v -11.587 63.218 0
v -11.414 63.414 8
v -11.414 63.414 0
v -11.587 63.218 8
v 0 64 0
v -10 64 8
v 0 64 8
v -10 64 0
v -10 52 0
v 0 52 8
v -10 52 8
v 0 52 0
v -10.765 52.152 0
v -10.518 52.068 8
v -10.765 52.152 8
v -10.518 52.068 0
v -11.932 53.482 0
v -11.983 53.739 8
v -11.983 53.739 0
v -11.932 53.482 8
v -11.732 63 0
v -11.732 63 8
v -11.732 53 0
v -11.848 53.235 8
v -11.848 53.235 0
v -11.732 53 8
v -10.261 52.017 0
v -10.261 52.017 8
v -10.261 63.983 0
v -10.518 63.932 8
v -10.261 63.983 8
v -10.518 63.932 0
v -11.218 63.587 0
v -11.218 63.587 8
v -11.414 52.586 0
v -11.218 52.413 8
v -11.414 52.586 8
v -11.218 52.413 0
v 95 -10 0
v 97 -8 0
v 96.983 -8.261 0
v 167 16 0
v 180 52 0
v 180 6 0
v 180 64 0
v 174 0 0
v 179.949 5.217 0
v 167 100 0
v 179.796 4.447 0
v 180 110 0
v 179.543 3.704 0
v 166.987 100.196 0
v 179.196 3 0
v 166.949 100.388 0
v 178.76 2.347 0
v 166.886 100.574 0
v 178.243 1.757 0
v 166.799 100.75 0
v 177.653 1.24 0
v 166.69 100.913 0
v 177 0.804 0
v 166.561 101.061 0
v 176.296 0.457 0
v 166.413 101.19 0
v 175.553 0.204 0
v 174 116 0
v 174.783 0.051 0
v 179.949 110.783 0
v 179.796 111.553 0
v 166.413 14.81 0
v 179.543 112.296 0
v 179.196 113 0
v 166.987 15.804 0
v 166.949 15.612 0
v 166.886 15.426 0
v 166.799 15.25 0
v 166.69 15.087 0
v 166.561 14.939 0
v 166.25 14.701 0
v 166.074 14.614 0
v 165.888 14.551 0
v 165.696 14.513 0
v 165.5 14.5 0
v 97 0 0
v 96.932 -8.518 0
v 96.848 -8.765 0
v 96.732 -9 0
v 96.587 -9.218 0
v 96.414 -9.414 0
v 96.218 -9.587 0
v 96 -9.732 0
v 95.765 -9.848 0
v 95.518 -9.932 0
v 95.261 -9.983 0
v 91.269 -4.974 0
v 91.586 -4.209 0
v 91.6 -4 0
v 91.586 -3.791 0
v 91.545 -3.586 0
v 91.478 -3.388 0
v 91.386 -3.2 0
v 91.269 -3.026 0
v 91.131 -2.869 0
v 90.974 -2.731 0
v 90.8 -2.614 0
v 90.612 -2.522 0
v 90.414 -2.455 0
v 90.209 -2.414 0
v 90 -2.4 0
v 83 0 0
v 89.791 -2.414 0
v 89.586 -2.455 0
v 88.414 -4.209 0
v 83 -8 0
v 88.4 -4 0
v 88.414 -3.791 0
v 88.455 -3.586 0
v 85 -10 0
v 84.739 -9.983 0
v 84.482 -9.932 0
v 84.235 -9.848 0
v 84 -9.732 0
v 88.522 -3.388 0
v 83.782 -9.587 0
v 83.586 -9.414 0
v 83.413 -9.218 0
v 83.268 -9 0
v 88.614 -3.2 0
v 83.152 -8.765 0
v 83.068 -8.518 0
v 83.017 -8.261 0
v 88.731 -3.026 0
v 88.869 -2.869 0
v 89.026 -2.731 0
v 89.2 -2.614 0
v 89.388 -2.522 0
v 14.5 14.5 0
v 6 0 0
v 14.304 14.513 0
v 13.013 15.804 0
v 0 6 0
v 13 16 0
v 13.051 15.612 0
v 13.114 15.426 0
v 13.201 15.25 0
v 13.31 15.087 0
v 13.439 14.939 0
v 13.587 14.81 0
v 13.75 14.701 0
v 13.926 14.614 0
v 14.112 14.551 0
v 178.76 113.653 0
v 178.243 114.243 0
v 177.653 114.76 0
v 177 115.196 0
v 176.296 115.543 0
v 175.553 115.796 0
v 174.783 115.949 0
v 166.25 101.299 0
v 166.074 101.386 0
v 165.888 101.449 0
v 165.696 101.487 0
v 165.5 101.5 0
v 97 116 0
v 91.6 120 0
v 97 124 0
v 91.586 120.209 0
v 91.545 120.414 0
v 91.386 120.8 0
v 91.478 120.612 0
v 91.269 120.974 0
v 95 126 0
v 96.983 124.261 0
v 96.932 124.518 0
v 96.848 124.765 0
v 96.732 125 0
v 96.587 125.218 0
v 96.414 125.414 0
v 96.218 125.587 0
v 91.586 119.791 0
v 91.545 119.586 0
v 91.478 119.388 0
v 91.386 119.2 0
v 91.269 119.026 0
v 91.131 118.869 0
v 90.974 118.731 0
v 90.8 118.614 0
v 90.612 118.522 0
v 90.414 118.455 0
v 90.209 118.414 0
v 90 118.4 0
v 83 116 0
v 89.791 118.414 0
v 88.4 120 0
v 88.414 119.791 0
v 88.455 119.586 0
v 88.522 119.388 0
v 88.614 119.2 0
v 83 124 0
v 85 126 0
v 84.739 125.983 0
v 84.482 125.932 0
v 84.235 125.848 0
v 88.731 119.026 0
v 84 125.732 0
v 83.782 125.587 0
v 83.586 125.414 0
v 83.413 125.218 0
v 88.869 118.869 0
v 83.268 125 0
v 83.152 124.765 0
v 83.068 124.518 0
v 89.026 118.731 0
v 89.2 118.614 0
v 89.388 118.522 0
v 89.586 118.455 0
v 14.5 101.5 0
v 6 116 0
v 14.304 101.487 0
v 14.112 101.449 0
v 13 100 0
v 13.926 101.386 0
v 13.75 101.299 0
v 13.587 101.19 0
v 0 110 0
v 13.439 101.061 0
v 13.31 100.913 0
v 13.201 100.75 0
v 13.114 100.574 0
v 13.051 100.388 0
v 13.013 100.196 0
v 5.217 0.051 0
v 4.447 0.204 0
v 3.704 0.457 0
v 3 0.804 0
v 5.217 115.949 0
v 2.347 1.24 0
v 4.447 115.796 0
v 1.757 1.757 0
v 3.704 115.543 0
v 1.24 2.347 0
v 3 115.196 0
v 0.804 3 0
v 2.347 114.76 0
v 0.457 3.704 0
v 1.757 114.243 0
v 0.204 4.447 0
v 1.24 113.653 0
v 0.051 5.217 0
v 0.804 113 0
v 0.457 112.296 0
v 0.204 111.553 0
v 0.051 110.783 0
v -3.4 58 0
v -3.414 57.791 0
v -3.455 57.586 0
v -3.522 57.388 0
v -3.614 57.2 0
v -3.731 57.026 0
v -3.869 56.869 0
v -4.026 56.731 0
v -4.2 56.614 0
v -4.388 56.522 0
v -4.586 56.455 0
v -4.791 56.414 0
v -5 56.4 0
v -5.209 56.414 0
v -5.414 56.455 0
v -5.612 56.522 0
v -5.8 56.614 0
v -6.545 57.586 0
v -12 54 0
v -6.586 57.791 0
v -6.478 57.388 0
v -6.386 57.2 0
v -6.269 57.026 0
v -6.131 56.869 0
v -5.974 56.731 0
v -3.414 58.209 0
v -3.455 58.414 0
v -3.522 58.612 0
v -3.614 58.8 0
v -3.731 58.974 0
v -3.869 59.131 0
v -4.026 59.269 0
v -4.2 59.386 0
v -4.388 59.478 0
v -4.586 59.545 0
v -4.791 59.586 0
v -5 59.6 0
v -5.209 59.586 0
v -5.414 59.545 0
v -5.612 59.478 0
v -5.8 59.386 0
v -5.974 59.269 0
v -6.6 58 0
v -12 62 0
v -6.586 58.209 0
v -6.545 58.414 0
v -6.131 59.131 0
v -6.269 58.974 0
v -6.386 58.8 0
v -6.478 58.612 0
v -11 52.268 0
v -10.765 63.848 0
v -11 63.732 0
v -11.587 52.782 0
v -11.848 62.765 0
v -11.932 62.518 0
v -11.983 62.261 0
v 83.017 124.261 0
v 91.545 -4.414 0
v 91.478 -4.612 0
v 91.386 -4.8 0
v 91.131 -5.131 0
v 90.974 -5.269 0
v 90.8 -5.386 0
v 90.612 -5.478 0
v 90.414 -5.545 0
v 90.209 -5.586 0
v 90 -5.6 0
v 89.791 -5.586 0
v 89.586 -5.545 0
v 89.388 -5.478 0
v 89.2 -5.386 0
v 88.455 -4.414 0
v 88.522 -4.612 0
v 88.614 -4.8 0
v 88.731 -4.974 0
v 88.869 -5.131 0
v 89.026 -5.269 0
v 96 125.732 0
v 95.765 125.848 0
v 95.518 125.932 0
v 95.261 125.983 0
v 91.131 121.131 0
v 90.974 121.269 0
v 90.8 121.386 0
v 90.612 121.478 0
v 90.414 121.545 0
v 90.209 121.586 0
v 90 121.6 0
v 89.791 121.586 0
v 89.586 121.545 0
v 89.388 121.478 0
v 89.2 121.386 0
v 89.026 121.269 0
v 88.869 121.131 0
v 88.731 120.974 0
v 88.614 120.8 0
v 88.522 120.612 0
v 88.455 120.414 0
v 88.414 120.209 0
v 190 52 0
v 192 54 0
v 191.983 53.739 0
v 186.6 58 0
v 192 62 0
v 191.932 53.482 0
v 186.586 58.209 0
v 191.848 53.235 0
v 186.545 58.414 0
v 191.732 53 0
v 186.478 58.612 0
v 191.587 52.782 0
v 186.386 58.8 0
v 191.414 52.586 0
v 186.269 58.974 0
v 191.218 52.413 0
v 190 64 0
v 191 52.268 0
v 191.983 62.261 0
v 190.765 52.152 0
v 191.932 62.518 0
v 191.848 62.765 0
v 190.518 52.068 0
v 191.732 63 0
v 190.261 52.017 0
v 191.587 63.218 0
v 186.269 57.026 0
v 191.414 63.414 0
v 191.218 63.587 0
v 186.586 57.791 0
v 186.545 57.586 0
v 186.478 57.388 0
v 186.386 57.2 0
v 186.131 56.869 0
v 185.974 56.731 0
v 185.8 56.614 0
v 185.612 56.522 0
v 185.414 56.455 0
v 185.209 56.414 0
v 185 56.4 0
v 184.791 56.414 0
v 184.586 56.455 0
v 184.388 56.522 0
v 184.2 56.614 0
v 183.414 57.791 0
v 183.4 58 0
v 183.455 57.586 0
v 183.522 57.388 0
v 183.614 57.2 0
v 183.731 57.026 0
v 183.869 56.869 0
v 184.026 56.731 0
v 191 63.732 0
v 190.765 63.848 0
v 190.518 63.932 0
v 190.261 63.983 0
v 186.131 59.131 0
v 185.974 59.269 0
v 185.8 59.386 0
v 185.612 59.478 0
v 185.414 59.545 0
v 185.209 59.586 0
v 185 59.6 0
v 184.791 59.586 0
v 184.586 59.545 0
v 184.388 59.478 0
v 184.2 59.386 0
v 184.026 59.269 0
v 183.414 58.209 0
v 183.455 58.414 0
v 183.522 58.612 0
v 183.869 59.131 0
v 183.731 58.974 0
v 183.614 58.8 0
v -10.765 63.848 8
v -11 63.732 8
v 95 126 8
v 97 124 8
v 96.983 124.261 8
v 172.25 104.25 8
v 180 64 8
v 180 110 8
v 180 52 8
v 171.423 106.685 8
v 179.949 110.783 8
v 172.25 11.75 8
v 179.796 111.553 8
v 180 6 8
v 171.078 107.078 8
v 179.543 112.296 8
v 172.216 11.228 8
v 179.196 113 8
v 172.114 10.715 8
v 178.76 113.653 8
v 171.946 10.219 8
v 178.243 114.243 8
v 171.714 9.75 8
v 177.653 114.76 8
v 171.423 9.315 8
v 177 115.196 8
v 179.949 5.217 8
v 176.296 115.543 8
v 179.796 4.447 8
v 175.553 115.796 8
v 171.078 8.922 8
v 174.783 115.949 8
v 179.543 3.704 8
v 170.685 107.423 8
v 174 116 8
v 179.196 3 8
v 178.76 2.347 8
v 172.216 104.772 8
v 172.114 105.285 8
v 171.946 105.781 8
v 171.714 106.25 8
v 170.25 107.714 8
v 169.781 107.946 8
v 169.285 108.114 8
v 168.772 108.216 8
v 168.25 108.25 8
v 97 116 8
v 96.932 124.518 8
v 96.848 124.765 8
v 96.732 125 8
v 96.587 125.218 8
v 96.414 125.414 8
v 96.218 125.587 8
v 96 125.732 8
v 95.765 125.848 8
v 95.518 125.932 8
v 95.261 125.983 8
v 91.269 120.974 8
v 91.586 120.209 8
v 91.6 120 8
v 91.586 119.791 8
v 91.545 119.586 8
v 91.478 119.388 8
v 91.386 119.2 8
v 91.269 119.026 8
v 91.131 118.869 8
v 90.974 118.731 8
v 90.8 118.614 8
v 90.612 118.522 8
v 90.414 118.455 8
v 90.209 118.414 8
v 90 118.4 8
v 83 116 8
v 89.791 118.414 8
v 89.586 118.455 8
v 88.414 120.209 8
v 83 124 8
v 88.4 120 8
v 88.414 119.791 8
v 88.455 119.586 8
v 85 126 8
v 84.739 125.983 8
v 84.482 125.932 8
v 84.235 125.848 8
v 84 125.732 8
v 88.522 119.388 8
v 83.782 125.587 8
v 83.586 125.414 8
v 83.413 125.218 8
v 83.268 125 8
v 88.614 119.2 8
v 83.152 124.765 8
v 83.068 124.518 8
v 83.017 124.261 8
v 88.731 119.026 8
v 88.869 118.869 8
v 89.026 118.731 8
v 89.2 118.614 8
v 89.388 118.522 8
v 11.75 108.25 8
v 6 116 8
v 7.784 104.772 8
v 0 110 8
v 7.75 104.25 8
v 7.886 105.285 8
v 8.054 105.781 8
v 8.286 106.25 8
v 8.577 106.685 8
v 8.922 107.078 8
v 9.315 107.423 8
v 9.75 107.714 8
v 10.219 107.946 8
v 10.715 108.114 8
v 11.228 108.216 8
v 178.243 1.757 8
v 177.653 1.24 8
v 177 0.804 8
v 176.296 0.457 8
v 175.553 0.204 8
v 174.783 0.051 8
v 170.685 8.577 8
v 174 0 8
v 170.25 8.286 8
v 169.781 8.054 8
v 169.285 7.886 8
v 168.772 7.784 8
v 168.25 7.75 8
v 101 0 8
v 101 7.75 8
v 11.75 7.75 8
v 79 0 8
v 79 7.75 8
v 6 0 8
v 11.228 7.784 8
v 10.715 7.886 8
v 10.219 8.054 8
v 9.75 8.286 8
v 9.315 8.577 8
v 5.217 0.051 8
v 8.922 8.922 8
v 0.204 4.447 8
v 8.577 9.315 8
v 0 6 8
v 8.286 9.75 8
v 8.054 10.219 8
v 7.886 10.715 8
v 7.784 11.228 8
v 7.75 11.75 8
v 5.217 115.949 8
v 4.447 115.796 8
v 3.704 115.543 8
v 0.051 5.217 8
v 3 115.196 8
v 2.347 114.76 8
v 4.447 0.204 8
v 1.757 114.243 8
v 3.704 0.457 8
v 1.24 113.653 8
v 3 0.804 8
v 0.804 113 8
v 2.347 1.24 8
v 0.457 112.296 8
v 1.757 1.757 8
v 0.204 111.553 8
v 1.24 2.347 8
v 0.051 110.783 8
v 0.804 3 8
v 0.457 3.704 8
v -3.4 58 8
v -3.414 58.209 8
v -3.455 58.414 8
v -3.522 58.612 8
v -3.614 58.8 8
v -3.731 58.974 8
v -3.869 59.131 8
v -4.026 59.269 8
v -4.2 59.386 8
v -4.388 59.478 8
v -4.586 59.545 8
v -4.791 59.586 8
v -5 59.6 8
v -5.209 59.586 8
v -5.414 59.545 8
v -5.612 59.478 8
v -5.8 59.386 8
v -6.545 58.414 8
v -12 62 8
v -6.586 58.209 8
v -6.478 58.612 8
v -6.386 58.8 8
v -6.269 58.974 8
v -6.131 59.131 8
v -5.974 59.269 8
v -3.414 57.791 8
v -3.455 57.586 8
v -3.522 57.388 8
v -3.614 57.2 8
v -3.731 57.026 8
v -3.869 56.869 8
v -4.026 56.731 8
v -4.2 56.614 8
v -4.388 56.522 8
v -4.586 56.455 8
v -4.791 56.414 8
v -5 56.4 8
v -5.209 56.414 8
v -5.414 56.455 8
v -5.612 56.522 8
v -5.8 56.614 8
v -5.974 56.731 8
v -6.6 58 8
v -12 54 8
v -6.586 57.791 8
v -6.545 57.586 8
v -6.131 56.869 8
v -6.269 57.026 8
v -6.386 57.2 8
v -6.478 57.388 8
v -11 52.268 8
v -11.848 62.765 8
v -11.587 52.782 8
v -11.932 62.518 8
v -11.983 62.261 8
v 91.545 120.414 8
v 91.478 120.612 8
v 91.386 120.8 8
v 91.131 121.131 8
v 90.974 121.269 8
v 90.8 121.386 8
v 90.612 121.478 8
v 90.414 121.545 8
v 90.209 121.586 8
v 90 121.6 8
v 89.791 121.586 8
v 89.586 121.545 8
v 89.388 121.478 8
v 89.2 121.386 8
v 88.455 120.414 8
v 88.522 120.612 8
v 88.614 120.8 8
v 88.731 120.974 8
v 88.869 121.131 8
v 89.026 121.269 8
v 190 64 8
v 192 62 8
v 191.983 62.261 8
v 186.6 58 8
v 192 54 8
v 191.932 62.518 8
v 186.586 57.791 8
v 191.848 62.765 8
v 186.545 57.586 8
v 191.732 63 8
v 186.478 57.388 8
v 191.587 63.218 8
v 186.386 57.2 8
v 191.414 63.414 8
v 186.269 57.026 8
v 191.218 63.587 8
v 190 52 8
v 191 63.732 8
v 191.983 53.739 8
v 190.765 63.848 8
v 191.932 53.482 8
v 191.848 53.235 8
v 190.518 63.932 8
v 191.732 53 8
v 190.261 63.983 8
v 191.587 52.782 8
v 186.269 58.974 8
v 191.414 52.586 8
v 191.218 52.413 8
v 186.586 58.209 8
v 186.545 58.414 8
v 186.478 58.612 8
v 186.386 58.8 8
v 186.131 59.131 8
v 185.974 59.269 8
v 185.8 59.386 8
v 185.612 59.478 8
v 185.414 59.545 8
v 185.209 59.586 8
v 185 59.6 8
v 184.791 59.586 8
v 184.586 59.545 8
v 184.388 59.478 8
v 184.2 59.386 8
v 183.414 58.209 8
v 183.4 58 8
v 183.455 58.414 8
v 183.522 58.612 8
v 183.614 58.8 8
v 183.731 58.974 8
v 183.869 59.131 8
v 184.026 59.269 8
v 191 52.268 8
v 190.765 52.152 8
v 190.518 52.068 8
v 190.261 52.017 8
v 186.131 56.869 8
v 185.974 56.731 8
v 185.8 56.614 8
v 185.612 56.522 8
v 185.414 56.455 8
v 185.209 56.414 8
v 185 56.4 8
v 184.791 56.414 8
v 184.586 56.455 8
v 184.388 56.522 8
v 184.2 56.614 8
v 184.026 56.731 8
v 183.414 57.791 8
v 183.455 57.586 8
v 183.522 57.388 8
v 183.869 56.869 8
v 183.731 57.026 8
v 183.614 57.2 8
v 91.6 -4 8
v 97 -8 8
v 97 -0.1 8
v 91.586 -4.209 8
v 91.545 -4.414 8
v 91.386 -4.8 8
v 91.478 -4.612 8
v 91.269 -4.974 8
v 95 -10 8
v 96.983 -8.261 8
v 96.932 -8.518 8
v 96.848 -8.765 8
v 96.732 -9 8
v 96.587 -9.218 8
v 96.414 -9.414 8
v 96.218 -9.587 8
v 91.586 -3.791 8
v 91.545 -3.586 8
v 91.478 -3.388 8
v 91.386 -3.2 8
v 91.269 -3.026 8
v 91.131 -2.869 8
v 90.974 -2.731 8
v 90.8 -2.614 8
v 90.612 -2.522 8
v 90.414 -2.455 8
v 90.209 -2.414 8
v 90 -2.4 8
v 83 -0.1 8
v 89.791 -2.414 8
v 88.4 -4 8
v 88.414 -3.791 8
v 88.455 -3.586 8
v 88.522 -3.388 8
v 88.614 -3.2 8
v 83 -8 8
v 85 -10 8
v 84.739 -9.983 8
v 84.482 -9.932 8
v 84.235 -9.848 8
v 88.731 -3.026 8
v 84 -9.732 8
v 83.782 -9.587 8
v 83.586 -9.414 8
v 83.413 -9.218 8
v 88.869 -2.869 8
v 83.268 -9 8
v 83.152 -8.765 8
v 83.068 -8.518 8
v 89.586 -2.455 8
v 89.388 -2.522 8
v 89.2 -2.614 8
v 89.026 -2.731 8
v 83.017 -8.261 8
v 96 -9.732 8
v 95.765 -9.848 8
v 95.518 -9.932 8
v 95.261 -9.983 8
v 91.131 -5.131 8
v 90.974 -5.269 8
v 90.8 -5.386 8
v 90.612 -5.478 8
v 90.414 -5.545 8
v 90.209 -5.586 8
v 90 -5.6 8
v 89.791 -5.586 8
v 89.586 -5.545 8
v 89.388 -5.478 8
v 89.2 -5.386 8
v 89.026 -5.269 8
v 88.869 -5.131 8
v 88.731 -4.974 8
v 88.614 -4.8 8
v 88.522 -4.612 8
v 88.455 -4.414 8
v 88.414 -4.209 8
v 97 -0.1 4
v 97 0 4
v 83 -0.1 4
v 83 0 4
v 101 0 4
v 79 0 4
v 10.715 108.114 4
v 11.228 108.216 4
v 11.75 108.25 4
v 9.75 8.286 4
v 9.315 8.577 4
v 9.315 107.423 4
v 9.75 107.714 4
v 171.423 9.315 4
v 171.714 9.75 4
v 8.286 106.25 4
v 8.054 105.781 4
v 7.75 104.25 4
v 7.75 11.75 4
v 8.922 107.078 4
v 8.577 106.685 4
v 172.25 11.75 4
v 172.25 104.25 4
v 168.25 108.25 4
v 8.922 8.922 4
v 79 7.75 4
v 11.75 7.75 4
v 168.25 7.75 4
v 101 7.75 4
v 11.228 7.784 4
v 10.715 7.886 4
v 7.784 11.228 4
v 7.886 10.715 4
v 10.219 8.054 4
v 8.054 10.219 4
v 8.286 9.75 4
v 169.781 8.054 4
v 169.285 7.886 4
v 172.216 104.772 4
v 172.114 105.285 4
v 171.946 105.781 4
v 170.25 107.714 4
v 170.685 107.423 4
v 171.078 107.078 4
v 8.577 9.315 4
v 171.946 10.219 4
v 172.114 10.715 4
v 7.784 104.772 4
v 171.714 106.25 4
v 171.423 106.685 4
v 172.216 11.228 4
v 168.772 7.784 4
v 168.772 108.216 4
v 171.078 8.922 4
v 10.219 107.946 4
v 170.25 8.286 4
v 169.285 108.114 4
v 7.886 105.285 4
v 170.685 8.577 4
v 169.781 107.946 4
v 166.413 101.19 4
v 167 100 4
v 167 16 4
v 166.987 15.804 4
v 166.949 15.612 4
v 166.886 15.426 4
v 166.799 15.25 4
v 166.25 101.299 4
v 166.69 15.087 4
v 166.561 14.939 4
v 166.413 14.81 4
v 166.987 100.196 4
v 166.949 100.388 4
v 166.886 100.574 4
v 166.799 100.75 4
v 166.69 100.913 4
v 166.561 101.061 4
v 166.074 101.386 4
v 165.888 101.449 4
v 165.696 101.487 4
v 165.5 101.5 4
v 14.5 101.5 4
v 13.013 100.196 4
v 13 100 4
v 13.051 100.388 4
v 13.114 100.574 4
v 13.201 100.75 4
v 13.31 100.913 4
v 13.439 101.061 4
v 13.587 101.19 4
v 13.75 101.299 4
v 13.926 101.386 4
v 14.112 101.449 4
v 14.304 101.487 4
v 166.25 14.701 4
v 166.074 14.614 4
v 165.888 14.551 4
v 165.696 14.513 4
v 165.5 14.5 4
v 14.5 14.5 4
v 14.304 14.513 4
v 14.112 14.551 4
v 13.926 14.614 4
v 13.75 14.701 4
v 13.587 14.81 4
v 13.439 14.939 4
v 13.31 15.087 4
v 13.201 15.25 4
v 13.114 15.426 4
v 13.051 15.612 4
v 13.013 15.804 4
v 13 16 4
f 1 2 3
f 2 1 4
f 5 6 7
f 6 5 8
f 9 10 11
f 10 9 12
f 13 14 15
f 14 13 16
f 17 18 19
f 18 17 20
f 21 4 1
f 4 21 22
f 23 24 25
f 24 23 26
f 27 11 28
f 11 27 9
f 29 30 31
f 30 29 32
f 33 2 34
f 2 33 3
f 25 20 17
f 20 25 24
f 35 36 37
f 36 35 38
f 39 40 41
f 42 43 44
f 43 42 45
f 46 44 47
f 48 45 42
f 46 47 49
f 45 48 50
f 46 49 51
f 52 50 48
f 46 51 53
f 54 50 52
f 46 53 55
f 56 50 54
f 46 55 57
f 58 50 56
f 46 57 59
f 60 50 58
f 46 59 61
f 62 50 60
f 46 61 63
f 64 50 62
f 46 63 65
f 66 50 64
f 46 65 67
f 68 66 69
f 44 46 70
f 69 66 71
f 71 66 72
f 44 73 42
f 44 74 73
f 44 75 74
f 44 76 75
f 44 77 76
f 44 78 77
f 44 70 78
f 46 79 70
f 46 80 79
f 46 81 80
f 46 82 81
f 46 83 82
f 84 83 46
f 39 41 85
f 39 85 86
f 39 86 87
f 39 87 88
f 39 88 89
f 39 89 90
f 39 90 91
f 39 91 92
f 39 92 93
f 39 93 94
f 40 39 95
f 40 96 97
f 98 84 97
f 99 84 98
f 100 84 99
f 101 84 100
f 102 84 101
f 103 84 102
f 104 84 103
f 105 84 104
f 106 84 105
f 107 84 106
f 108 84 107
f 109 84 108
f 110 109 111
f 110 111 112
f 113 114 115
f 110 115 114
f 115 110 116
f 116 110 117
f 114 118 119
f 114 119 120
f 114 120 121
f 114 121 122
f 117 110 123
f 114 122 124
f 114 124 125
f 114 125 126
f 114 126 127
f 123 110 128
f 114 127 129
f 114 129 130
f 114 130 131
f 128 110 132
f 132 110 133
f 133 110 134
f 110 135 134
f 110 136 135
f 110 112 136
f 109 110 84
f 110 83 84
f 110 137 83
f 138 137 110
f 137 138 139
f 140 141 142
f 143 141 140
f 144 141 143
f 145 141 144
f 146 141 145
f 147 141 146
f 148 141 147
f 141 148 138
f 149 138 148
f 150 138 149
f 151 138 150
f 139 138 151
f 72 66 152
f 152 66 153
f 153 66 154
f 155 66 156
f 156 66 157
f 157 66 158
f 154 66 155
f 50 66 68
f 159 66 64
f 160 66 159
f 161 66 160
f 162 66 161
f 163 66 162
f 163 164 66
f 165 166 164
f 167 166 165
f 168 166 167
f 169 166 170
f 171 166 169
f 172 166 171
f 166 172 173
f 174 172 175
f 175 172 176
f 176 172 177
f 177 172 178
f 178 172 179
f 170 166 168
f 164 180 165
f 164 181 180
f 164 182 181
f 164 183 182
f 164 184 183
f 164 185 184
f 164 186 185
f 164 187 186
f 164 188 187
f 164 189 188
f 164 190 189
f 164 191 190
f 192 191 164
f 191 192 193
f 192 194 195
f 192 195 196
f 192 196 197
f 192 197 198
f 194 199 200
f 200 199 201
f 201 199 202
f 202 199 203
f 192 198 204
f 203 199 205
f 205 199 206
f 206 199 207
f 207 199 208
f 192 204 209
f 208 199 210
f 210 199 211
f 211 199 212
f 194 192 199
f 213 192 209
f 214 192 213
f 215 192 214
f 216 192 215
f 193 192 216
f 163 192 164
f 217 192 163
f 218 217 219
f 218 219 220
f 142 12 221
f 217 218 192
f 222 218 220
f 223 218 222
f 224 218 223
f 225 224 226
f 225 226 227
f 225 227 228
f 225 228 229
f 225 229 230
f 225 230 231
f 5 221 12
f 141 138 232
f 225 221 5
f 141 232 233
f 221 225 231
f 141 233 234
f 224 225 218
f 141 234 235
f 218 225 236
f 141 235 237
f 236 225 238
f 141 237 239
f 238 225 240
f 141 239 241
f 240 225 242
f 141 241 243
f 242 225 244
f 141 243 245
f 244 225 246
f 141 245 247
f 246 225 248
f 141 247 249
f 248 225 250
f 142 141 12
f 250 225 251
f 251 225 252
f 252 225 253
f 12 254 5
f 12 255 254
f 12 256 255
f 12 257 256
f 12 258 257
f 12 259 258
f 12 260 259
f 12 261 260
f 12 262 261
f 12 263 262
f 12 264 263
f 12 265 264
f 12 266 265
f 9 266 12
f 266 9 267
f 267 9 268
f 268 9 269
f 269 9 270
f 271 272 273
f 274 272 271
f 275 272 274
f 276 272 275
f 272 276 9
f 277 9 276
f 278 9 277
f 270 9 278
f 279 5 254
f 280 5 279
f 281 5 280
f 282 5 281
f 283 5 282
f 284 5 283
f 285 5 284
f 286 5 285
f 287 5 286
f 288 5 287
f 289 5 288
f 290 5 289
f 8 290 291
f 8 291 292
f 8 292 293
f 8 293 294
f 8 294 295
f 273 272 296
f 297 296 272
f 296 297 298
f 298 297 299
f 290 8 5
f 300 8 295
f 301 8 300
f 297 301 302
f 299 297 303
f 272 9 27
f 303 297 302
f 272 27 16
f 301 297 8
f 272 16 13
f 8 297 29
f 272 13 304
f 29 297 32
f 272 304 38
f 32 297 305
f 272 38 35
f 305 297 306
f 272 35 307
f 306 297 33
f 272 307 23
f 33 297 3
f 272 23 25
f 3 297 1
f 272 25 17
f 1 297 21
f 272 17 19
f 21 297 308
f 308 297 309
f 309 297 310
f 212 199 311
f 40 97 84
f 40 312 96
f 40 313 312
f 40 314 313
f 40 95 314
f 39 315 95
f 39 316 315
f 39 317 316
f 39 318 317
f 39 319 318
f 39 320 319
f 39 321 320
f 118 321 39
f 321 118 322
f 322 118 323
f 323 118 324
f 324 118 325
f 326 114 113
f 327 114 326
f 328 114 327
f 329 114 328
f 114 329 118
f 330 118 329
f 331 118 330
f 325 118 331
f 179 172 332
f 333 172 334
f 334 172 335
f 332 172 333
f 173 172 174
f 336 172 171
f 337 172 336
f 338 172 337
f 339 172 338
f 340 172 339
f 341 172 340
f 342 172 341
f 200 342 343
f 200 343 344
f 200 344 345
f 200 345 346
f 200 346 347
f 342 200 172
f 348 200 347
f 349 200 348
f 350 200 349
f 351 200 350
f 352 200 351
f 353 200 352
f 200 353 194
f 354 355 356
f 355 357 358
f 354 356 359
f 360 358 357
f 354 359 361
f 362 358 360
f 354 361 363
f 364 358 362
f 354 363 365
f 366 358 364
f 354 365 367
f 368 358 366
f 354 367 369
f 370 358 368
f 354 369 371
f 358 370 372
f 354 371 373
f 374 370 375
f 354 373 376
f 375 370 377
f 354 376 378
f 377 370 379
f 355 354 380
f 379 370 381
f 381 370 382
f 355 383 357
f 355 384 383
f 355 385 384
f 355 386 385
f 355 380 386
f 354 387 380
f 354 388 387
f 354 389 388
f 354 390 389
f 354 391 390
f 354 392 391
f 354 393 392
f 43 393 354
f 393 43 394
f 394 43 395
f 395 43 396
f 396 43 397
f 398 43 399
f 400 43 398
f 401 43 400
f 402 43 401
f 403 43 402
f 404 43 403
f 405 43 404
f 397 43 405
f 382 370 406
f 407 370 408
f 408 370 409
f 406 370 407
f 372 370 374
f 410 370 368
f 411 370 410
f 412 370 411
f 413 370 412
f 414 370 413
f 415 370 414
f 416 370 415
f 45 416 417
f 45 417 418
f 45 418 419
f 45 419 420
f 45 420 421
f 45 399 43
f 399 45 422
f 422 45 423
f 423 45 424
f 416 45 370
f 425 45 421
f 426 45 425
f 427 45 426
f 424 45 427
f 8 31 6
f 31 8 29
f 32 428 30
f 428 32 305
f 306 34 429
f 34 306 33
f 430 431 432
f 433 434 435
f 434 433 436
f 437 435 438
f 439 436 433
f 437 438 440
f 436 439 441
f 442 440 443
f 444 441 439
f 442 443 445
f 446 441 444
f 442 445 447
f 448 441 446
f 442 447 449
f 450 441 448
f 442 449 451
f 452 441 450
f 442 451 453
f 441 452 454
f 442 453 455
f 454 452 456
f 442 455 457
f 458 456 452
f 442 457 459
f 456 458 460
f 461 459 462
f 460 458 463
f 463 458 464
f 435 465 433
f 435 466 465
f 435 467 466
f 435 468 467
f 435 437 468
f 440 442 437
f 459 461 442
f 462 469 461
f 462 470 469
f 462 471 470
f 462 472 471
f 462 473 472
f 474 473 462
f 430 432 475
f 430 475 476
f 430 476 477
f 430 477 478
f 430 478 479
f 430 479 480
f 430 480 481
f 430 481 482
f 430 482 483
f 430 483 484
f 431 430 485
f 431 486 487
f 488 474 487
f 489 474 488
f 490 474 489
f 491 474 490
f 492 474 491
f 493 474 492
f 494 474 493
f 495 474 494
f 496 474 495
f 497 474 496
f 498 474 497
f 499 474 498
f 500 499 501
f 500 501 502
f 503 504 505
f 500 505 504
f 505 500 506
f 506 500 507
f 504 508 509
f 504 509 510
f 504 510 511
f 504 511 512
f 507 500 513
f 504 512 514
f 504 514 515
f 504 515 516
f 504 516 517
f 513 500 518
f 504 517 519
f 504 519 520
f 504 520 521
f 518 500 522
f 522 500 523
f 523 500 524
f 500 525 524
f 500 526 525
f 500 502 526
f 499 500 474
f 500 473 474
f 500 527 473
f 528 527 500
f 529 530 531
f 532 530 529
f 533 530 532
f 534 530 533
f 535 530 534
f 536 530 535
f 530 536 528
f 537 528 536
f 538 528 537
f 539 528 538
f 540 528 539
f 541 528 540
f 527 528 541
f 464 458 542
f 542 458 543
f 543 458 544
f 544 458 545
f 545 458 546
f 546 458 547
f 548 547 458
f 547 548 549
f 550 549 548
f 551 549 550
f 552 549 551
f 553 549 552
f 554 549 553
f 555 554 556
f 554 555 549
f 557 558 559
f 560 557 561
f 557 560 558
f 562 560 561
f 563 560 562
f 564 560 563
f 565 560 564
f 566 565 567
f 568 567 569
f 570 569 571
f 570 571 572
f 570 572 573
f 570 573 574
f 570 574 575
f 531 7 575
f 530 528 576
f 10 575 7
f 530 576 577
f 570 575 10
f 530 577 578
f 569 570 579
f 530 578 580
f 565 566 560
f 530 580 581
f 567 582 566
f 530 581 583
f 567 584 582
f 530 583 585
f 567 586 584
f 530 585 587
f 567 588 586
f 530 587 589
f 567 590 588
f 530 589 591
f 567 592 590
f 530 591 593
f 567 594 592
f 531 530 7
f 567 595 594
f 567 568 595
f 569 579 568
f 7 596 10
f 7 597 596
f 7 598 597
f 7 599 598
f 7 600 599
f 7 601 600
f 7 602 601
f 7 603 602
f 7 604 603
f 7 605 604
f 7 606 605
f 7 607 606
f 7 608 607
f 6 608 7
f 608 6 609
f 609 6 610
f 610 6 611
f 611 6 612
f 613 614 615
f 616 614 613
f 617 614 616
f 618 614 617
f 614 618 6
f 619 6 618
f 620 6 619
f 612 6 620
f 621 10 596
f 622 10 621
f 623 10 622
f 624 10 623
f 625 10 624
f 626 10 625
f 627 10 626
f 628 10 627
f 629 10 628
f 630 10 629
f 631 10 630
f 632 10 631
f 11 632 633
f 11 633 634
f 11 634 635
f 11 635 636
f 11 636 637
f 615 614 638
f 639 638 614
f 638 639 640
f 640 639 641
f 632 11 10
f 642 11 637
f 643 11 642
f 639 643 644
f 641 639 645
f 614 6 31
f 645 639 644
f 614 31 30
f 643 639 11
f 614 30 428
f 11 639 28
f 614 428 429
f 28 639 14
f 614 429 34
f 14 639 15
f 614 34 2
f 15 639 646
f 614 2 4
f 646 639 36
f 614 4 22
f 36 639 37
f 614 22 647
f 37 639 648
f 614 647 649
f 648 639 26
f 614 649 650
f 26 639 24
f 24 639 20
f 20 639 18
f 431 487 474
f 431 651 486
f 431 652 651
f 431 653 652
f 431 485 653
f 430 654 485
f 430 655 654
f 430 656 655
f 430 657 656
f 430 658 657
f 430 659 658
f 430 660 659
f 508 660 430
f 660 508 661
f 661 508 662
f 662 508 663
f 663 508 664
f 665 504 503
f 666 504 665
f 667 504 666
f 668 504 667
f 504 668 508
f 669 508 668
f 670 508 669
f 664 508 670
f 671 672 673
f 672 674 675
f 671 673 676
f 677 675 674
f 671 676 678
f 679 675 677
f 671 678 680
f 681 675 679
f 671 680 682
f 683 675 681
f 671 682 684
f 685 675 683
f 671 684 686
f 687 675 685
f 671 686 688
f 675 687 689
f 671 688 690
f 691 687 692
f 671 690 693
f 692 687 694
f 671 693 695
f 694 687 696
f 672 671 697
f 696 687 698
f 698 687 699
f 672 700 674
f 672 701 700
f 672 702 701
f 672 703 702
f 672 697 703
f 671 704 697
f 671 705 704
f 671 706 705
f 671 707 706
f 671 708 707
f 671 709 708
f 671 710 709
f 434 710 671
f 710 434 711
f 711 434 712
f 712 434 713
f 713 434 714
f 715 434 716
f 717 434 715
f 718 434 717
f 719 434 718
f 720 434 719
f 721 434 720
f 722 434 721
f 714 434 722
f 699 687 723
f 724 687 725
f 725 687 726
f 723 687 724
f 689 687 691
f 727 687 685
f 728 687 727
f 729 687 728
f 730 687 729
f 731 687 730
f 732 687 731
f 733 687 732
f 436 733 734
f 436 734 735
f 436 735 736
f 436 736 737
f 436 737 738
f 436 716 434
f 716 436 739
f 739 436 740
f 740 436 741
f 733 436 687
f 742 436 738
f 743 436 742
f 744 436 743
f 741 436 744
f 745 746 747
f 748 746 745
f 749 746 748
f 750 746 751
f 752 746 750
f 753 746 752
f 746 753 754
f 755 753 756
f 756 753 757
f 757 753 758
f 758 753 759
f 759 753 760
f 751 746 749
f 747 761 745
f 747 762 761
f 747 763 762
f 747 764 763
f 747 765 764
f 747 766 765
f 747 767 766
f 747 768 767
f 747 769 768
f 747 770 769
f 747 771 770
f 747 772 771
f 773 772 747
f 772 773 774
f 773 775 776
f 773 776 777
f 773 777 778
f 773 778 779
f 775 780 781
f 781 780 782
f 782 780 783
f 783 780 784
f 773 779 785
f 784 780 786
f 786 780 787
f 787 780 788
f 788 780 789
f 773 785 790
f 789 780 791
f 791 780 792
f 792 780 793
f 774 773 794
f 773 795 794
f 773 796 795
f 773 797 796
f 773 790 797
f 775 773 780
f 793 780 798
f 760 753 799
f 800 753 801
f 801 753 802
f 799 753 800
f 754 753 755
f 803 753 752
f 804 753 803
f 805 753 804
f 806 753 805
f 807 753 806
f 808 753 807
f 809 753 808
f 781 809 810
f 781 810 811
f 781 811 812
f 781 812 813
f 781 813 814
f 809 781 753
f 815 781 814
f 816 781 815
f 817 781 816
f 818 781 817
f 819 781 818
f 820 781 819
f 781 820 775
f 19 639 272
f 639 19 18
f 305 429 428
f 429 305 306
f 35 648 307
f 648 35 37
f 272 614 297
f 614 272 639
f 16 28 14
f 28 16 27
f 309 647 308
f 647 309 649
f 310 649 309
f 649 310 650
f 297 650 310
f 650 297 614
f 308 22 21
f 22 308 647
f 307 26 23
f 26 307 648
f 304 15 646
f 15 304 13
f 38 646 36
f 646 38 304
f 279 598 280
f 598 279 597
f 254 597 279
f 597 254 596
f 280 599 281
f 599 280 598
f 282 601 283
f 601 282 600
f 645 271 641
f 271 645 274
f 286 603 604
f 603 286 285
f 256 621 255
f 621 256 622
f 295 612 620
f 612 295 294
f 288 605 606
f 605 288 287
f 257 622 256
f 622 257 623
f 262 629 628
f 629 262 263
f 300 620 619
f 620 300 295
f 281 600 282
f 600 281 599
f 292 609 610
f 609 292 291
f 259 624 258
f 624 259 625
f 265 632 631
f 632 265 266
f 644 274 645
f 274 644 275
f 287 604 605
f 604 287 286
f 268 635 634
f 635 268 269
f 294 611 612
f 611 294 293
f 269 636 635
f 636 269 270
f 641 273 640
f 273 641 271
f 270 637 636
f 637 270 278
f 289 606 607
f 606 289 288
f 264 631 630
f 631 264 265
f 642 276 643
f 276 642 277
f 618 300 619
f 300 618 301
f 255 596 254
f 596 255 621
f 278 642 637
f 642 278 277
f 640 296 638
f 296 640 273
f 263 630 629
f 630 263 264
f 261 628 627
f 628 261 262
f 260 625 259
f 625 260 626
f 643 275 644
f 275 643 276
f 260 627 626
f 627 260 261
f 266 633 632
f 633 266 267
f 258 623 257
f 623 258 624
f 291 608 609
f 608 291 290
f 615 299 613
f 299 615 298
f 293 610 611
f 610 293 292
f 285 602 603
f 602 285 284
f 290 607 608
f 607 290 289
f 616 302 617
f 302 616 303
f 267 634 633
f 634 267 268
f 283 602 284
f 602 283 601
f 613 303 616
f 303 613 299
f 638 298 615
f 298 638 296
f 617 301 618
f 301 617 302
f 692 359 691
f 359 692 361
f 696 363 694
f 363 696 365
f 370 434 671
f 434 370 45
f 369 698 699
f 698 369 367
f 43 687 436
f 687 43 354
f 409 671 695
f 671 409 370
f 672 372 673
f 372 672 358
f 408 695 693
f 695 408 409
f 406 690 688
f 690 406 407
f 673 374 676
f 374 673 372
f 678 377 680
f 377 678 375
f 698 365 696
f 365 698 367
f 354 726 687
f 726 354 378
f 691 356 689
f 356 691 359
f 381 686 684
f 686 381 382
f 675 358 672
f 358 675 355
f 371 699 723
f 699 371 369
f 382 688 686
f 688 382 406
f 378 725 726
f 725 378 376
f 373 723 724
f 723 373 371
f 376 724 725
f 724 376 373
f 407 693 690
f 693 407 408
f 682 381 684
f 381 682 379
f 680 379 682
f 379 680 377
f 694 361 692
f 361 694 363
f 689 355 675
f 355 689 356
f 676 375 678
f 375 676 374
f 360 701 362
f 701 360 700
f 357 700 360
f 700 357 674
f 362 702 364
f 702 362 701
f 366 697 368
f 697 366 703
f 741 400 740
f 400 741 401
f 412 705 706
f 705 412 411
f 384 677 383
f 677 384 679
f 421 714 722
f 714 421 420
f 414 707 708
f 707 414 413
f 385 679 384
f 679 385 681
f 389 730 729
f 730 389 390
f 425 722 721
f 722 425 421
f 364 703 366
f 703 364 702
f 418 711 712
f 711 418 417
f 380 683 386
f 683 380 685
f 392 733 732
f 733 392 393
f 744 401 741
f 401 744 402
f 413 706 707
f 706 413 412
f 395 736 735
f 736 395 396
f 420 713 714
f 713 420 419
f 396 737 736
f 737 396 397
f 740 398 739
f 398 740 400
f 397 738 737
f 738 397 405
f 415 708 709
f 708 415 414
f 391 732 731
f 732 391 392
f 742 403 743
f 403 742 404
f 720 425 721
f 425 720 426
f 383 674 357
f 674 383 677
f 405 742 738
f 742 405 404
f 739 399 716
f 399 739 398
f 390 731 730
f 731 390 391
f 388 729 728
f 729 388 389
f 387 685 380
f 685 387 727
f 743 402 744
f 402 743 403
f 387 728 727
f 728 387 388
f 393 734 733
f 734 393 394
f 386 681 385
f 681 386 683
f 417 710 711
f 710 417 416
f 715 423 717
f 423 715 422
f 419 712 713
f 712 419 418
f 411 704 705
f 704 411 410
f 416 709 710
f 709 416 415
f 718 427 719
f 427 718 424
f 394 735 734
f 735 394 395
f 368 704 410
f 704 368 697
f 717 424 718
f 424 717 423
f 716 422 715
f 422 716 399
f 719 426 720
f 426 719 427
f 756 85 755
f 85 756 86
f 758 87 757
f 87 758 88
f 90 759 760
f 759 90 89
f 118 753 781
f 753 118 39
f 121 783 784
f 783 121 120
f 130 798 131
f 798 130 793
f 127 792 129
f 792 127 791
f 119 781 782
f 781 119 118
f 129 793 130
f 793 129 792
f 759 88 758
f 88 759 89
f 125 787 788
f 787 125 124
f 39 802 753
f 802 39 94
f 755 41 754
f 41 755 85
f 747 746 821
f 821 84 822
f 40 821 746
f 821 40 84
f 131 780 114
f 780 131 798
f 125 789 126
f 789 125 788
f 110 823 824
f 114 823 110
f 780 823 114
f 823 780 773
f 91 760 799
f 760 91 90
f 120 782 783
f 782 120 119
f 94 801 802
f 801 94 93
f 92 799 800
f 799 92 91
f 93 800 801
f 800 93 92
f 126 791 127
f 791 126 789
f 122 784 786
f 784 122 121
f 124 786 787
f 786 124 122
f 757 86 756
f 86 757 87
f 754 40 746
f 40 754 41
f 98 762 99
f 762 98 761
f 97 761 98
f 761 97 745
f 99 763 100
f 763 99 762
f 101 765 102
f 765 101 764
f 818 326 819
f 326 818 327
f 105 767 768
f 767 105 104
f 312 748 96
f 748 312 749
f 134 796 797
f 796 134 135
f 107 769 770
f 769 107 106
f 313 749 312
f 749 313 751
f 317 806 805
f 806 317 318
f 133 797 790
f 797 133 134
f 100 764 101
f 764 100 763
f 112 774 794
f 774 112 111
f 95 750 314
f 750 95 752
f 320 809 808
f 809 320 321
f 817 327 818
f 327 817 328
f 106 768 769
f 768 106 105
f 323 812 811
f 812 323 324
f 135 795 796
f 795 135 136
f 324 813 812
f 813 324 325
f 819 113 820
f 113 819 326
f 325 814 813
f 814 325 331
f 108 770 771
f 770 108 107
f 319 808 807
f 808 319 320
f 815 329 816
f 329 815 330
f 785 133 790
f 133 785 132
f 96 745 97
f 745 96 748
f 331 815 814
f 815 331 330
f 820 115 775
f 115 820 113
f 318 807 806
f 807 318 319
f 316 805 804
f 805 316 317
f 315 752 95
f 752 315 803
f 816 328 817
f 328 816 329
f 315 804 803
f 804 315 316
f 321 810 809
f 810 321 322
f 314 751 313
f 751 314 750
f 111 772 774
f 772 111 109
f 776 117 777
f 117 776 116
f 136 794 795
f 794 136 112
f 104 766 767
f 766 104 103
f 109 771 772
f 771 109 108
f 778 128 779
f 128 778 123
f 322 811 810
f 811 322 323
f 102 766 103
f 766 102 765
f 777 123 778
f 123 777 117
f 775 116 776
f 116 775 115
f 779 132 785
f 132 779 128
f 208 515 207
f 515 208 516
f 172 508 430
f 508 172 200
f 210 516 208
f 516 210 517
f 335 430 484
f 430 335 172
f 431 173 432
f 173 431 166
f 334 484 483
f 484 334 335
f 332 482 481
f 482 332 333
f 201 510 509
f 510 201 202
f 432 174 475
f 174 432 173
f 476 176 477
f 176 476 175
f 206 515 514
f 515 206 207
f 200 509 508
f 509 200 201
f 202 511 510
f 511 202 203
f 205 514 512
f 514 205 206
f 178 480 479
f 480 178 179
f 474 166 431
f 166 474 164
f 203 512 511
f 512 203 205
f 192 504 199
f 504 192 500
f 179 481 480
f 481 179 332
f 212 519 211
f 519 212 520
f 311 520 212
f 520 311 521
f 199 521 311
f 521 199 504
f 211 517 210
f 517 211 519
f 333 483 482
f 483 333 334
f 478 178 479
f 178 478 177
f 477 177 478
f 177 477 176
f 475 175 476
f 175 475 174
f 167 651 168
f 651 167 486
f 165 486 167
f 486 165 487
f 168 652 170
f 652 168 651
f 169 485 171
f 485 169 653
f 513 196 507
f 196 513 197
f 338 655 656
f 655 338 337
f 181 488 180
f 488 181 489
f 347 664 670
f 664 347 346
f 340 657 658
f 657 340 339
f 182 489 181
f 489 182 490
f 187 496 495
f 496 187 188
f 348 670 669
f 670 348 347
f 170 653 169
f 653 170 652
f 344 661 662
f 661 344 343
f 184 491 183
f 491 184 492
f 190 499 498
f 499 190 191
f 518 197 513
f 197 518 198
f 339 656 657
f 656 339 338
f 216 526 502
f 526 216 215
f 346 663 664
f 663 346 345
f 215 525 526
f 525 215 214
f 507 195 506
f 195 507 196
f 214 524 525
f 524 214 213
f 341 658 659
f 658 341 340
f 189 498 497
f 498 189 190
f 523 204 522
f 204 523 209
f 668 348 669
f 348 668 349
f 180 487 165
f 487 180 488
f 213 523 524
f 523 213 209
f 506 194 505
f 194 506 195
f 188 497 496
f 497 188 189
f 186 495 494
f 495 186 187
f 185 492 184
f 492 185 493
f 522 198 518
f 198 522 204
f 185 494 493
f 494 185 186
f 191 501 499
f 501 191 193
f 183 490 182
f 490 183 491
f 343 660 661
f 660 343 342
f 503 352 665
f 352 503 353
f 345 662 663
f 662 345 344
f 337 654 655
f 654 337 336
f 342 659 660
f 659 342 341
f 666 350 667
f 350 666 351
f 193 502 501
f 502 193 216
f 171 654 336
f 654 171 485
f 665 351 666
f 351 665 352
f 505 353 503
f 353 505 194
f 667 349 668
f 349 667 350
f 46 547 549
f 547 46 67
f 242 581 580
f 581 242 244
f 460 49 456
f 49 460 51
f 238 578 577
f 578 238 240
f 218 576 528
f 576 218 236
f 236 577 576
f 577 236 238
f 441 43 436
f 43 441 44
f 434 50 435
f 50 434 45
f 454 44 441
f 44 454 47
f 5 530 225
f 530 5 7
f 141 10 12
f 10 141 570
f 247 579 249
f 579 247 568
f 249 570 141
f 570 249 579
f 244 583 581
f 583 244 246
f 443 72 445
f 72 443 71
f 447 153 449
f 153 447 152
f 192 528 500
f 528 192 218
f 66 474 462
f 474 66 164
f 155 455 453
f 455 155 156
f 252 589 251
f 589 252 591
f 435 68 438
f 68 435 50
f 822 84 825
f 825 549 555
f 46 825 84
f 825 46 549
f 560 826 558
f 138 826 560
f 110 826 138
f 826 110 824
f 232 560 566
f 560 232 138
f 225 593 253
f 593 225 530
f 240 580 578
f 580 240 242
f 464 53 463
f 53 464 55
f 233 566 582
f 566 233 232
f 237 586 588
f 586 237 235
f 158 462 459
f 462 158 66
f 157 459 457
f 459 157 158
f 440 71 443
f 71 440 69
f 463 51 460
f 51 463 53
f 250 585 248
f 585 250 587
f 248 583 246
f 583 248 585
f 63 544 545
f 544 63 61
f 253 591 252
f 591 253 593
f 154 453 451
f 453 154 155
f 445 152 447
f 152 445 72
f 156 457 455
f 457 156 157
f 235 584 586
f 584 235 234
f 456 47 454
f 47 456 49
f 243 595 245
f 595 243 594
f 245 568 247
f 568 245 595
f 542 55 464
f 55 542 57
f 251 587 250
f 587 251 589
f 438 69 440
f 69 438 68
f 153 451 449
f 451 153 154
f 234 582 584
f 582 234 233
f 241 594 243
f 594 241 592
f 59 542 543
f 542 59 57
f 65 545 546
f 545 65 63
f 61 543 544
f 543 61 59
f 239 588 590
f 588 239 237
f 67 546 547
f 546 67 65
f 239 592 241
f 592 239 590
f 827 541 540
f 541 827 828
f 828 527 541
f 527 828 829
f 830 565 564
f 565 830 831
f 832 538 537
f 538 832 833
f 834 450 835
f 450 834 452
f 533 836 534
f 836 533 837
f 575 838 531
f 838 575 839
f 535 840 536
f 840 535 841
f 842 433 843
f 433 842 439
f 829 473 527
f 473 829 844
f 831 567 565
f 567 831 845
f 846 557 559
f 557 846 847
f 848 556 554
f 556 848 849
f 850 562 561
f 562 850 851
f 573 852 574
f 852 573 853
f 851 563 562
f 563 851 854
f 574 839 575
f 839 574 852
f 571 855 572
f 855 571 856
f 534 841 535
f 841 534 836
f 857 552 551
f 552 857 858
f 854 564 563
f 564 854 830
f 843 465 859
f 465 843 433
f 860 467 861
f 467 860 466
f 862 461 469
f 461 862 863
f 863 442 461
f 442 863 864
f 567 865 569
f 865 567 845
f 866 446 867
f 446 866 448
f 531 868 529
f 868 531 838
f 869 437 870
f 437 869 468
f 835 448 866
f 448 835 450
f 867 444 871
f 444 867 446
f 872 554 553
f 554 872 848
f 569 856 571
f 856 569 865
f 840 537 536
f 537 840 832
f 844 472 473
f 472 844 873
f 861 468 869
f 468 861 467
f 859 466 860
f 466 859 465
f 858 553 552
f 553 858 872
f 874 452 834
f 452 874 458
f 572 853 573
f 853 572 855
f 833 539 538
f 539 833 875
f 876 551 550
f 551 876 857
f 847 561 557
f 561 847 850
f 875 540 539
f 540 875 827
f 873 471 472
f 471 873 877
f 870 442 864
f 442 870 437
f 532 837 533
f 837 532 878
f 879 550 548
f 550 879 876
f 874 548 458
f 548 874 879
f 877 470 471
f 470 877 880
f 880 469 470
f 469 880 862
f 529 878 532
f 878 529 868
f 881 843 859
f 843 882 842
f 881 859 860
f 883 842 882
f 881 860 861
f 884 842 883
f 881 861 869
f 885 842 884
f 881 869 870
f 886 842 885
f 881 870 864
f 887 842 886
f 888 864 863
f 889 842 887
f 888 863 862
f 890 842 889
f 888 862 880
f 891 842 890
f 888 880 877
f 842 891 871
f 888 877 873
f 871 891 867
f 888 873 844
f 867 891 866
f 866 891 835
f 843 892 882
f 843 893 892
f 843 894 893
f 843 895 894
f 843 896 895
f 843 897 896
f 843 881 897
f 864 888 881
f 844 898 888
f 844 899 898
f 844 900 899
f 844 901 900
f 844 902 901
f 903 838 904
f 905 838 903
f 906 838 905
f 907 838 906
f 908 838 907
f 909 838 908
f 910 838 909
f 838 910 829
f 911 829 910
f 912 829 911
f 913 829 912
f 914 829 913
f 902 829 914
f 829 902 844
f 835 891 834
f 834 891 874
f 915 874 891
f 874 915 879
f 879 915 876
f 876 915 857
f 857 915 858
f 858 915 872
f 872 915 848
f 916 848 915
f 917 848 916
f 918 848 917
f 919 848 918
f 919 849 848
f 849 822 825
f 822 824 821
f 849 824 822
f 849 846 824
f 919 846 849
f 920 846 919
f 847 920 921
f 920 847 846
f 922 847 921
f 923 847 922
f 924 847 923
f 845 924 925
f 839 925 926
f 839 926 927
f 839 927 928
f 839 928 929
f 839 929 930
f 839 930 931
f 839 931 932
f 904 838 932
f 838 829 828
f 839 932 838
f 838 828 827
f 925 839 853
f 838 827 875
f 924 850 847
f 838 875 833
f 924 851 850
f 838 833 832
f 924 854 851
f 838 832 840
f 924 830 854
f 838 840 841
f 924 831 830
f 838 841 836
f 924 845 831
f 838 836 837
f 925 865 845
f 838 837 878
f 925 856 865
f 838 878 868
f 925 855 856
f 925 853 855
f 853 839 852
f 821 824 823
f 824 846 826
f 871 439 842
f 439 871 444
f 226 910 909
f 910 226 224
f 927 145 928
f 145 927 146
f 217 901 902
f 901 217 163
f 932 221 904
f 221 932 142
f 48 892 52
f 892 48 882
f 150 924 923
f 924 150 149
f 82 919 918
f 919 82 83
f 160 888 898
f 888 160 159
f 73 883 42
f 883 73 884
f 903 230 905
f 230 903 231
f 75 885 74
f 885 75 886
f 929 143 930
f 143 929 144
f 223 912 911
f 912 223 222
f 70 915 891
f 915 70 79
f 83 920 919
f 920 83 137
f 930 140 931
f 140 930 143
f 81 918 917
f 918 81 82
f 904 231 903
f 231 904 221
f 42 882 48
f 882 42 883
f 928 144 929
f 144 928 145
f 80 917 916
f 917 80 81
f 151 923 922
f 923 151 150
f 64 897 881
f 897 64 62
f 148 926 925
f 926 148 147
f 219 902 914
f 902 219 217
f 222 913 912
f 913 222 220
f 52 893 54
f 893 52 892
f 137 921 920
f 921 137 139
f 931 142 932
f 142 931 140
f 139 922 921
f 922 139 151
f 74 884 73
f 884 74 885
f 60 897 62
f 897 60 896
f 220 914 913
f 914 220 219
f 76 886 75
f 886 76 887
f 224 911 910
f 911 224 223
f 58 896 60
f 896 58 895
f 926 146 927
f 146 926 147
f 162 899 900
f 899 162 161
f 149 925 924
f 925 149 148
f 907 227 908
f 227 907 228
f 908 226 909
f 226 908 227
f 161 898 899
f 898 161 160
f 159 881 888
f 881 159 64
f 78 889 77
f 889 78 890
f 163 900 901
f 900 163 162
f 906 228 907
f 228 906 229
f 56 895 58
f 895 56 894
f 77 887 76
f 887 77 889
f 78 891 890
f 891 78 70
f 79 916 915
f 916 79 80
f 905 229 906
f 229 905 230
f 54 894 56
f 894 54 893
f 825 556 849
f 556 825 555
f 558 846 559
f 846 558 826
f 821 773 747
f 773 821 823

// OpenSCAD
// =============================================================================
// PLACEHOLDER — NOT a cabin-ready print
// =============================================================================
// 7" landscape AMOLED bezel / frame (Wisecoco-class panel, Phase 1 bench).
//
// Bay callipers are REQUIRED before any in-car / cabin print.
// These numbers are typical-datasheet guesses, not a measured AP1 bay or
// a measured panel. Do not treat this as production geometry.
//
// Print in PETG or ASA. Do NOT use PLA in the cabin (heat soak, creep,
// warpage against a sun-loaded dash).
// =============================================================================

$fn = 48;

// --- guessed panel envelope (MEASURE THE REAL PART) -------------------------
// Overall module ~164 × 100 mm; active area ~154 × 87 mm (16:9 / 7").
panel_w = 164.0;
panel_h = 100.0;
panel_t = 4.0;          // stack thickness guess — callipers required
active_w = 154.0;
active_h = 87.0;

bezel_margin = 8.0;     // frame around the module
lip = 2.0;              // retention lip over the glass edge
frame_t = 8.0;
pocket_clear = 0.5;     // slip fit guess — measure
corner_r = 4.0;

// Outer frame
outer_w = panel_w + 2 * bezel_margin;
outer_h = panel_h + 2 * bezel_margin;

// Cable escape (placeholder location — confirm on the real FPC/HDMI tail)
cable_w = 22.0;
cable_h = 6.0;

// Mounting ears (PLACEHOLDER hole pattern — do not drill the bay from this)
ear_w = 14.0;
ear_h = 12.0;
ear_hole = 3.2;         // M3 clearance guess

module round_rect(w, h, t, r) {
    rr = min(r, w / 2, h / 2);
    hull() {
        for (x = [rr, w - rr], y = [rr, h - rr])
            translate([x, y, 0])
                cylinder(h = t, r = rr);
    }
}

module mounting_ear() {
    difference() {
        round_rect(ear_w, ear_h, frame_t, 2.0);
        translate([ear_w / 2, ear_h / 2, -0.1])
            cylinder(h = frame_t + 0.2, d = ear_hole);
    }
}

module bezel() {
    difference() {
        union() {
            round_rect(outer_w, outer_h, frame_t, corner_r + 2);

            // Four guessed ears — positions are NOT bay-accurate
            translate([-ear_w + 2, outer_h / 2 - ear_h / 2, 0])
                mounting_ear();
            translate([outer_w - 2, outer_h / 2 - ear_h / 2, 0])
                mounting_ear();
            translate([outer_w / 2 - ear_w / 2, -ear_h + 2, 0])
                mounting_ear();
            translate([outer_w / 2 - ear_w / 2, outer_h - 2, 0])
                mounting_ear();
        }

        // Panel pocket (from the back)
        translate([
            bezel_margin - pocket_clear / 2,
            bezel_margin - pocket_clear / 2,
            frame_t - panel_t
        ])
            round_rect(
                panel_w + pocket_clear,
                panel_h + pocket_clear,
                panel_t + 0.2,
                corner_r
            );

        // Active-area viewing window (from the front)
        translate([
            (outer_w - active_w) / 2,
            (outer_h - active_h) / 2,
            -0.1
        ])
            round_rect(active_w, active_h, frame_t + 0.2, 1.5);

        // Cable / mini-HDMI tail escape (bottom centre — GUESS)
        translate([
            (outer_w - cable_w) / 2,
            -0.1,
            frame_t - panel_t
        ])
            cube([cable_w, bezel_margin + cable_h, panel_t + 0.2]);
    }

    // Retention lip drawn as the leftover ring (panel sits behind the window).
    // Front glass flush vs. recessed is UNKNOWN until the bay is callipered.
}

bezel();
